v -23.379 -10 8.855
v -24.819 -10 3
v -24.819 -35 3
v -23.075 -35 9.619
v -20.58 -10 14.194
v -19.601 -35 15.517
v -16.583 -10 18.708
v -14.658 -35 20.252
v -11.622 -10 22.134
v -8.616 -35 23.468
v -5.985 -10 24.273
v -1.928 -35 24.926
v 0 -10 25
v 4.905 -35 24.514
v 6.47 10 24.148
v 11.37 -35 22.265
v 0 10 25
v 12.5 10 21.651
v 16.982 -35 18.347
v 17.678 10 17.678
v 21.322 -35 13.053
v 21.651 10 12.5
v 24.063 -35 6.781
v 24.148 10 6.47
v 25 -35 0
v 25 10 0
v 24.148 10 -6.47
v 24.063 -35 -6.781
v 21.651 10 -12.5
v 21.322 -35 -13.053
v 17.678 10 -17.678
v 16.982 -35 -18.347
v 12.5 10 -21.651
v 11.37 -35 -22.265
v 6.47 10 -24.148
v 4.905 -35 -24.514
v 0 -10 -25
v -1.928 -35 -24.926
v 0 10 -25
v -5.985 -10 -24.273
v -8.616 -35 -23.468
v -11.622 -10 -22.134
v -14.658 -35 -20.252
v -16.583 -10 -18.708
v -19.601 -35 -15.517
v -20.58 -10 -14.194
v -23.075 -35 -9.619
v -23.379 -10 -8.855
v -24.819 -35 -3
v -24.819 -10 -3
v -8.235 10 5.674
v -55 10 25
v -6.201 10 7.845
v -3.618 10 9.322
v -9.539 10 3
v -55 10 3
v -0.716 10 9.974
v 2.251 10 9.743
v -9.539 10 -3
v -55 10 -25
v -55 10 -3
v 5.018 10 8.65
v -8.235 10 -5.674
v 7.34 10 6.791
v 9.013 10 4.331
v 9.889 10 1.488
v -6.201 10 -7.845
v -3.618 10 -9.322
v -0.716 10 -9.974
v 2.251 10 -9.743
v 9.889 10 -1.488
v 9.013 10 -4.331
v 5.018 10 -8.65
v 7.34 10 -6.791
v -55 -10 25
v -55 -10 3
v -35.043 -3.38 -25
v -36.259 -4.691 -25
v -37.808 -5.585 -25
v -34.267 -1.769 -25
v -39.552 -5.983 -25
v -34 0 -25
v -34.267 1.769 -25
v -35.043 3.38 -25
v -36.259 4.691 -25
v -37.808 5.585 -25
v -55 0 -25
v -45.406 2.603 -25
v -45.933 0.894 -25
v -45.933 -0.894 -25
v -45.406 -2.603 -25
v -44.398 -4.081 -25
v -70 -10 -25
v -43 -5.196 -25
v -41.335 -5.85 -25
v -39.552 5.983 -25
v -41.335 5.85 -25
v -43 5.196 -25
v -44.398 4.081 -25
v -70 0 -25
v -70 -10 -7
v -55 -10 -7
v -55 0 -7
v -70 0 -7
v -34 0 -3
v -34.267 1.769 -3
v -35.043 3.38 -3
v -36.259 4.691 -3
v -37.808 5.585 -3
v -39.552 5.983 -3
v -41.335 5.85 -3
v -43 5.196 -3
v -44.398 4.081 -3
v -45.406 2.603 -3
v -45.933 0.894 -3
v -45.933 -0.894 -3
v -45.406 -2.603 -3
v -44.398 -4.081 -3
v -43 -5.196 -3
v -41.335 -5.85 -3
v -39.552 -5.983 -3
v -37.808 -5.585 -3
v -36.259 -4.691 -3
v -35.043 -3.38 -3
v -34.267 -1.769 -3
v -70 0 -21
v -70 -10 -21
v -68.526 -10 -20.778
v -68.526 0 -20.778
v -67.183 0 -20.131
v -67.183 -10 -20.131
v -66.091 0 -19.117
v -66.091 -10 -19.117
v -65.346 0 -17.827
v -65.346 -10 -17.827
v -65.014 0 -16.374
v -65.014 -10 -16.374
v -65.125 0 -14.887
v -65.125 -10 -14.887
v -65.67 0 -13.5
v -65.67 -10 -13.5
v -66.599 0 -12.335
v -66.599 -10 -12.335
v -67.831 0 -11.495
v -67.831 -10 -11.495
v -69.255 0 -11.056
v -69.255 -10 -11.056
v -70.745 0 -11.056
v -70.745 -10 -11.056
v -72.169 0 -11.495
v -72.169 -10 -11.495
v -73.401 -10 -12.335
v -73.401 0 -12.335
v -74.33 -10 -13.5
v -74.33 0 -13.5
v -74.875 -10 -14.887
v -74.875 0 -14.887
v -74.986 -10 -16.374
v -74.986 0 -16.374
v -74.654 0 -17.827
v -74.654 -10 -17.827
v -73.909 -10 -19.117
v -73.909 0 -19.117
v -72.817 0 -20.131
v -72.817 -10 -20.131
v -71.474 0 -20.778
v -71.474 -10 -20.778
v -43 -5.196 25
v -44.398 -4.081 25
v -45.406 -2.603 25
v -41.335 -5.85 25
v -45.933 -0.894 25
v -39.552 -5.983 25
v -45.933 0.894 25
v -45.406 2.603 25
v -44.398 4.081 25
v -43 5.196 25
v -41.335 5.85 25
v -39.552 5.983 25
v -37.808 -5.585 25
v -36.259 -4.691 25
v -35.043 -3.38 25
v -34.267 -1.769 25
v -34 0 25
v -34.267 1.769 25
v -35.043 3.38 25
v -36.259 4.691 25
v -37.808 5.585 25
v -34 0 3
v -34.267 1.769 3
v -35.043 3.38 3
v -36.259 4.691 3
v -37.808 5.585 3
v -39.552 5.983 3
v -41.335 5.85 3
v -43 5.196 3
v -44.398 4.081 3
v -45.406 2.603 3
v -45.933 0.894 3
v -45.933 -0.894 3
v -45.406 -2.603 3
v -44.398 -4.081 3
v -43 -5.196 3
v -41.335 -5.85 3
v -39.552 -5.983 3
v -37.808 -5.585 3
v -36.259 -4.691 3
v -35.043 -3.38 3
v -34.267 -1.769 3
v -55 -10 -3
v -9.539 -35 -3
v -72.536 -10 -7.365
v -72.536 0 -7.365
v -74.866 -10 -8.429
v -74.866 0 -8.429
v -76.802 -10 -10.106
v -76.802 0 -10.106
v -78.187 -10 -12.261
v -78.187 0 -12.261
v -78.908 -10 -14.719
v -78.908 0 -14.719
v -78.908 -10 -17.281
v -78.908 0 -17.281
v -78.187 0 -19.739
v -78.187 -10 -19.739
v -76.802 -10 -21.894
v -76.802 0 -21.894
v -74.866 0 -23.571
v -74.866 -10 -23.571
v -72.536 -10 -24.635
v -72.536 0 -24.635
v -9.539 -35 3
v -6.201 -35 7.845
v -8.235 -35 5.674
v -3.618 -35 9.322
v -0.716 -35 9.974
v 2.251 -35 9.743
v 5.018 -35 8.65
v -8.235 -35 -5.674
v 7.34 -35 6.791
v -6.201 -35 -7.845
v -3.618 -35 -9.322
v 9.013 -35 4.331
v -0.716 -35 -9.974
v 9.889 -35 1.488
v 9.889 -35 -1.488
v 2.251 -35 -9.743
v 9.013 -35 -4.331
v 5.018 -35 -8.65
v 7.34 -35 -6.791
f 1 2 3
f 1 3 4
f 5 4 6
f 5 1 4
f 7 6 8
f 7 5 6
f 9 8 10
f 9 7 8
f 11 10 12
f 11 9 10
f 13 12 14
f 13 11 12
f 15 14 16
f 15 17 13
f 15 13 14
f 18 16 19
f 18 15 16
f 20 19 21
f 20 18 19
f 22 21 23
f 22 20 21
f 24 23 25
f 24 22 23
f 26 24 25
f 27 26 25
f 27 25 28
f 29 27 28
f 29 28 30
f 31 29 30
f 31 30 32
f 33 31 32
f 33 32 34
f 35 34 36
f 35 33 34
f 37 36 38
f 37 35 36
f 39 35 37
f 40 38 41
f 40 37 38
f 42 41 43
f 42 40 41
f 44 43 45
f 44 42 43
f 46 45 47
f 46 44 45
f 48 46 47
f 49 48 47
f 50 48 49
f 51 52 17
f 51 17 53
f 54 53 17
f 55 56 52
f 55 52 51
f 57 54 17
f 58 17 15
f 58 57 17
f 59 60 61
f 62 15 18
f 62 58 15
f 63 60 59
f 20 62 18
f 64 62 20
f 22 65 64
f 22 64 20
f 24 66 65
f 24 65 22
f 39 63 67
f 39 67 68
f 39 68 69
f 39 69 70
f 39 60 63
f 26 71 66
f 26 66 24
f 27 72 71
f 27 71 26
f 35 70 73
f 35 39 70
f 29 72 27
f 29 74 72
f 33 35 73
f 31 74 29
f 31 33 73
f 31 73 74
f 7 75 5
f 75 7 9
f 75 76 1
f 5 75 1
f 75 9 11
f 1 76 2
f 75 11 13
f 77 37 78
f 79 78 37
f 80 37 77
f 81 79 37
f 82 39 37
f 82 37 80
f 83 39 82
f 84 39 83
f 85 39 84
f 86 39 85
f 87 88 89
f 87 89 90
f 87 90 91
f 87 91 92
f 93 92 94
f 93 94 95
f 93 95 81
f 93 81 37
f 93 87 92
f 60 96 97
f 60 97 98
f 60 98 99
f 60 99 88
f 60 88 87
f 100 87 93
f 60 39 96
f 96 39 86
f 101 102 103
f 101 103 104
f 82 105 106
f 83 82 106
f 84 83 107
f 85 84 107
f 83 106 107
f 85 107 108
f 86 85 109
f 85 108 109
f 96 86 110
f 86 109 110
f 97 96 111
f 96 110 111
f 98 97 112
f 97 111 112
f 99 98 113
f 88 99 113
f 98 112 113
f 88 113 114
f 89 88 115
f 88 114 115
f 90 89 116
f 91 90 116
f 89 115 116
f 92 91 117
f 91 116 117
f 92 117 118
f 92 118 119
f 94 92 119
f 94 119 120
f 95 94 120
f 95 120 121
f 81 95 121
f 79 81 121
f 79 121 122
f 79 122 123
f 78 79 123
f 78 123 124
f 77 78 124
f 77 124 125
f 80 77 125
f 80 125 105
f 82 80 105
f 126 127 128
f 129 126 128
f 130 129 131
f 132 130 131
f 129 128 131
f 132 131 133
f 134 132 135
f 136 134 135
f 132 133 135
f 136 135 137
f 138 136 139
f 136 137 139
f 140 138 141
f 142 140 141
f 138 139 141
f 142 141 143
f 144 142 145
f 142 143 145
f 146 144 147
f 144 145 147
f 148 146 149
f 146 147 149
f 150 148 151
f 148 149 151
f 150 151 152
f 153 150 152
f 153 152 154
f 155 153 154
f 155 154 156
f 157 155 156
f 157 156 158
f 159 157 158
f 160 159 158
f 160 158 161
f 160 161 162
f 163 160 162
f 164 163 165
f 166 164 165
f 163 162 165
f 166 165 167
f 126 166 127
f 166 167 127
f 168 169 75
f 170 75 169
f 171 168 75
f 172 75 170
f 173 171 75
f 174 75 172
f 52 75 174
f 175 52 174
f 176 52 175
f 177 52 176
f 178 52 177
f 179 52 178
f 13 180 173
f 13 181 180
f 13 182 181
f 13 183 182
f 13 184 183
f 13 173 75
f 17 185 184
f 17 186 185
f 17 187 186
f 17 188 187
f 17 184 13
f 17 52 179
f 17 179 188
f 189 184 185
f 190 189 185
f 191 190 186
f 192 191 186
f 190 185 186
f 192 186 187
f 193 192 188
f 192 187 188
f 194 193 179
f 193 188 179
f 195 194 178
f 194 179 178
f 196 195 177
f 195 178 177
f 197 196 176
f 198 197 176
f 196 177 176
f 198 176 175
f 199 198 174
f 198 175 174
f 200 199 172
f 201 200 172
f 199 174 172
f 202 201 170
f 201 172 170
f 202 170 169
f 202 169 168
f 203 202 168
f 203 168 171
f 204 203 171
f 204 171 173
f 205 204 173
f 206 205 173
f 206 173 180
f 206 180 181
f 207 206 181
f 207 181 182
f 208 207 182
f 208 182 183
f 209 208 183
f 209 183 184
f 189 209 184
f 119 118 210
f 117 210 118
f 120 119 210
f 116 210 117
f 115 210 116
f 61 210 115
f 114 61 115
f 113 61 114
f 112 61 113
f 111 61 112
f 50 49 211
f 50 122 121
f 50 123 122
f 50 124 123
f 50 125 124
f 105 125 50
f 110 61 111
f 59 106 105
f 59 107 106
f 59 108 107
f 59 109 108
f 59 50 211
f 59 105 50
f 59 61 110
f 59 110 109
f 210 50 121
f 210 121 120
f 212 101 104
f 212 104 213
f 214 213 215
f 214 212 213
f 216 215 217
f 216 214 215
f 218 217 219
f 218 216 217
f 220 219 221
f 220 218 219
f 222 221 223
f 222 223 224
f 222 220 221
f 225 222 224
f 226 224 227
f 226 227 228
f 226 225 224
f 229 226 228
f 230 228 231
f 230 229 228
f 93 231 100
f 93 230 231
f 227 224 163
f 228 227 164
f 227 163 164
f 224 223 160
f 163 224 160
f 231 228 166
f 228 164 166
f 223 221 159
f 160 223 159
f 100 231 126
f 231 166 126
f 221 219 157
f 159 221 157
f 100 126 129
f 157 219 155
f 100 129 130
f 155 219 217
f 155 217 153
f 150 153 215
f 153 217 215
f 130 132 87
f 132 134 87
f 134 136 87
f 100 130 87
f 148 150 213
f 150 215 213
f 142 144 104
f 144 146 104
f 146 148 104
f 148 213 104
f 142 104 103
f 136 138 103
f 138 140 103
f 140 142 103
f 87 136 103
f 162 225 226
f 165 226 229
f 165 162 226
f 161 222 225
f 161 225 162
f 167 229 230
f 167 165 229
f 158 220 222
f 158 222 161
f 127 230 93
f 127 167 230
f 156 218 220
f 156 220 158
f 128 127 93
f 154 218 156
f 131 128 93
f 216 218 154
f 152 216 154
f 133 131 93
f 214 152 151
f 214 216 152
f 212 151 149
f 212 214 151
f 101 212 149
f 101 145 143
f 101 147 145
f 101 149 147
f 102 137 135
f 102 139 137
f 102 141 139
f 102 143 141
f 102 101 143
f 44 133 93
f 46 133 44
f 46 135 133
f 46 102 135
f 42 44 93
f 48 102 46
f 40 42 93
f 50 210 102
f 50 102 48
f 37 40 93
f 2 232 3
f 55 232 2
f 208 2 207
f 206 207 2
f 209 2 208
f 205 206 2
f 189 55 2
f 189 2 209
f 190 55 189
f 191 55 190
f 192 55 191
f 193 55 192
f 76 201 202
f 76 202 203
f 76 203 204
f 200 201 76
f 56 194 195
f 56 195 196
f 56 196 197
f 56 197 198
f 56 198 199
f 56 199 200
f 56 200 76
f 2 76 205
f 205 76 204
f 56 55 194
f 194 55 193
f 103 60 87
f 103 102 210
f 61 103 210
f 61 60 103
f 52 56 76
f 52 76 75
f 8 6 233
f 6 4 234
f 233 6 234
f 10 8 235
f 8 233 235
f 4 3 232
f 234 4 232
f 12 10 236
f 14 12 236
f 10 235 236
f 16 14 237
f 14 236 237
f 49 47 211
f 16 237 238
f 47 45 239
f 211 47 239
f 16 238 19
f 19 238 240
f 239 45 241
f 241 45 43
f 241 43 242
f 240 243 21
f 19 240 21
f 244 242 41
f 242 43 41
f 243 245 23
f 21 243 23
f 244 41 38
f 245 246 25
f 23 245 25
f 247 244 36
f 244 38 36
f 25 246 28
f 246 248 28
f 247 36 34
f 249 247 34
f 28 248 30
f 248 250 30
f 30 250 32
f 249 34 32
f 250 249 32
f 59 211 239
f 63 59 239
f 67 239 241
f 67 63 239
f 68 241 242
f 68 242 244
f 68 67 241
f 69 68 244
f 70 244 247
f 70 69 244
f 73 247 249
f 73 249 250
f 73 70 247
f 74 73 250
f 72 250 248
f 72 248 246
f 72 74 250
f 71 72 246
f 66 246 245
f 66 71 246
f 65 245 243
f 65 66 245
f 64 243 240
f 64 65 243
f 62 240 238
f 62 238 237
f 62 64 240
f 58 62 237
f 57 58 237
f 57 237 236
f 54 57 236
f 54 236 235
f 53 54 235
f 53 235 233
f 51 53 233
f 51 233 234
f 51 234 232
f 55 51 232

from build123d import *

# Parameters (mm, degrees)
BOSS_EXTRUDE1_DEPTH = 10
BOSS_EXTRUDE2_DEPTH = 45
SKETCH3_R           = 5
BOSS_EXTRUDE3_DEPTH = 10
HOLE1_D             = 12


with BuildPart() as part:
    # Sketch1 → Boss-Extrude1 (new, symmetric)
    with BuildSketch(Plane(origin=(0, 0, 0), x_dir=(1, 0, 0), z_dir=(0, 1, 0))):
        with BuildLine():
            Line((0, 25), (-55, 25))
            Line((-55, 25), (-55, 3))
            Line((-55, 3), (-9.539392014, 3))
            ThreePointArc((-9.539392014, 3), (10, 0), (-9.539392014, -3))
            Line((-9.539392014, -3), (-55, -3))
            Line((-55, -3), (-55, -25))
            Line((-55, -25), (0, -25))
            ThreePointArc((0, -25), (25, 0), (0, 25))
        make_face()
    extrude(amount=BOSS_EXTRUDE1_DEPTH, both=True)

    # Sketch2 → Boss-Extrude2 (add)
    with BuildSketch(Plane(origin=(0, 10, 0), x_dir=(1, 0, 0), z_dir=(0, 1, 0))):
        with BuildLine():
            Line((-9.539392014, -3), (-24.819347292, -3))
            ThreePointArc((-24.819347292, -3), (25, 0), (-24.819347292, 3))
            Line((-24.819347292, 3), (-9.539392014, 3))
            ThreePointArc((-9.539392014, 3), (10, 0), (-9.539392014, -3))
        make_face()
    extrude(amount=-BOSS_EXTRUDE2_DEPTH)

    # Sketch3 → Boss-Extrude3 (add)
    with BuildSketch(Plane.XZ.offset(10)):
        with BuildLine():
            Line((-55, -7), (-70, -7))
            ThreePointArc((-70, -7), (-79, -16), (-70, -25))
            Line((-70, -25), (-55, -25))
            Line((-55, -25), (-55, -7))
        make_face()
        with Locations(Location((-70, -16, 0), (0, 0, 270))):
            Circle(SKETCH3_R, mode=Mode.SUBTRACT)
    extrude(amount=-BOSS_EXTRUDE3_DEPTH)

    # Hole1 (through all)
    with Locations(Plane(origin=(0, 0, -25), x_dir=(-1, 0, 0), z_dir=(0, 0, -1))):
        with Locations((40, 0)):
            Hole(HOLE1_D / 2)


solid = part.part
